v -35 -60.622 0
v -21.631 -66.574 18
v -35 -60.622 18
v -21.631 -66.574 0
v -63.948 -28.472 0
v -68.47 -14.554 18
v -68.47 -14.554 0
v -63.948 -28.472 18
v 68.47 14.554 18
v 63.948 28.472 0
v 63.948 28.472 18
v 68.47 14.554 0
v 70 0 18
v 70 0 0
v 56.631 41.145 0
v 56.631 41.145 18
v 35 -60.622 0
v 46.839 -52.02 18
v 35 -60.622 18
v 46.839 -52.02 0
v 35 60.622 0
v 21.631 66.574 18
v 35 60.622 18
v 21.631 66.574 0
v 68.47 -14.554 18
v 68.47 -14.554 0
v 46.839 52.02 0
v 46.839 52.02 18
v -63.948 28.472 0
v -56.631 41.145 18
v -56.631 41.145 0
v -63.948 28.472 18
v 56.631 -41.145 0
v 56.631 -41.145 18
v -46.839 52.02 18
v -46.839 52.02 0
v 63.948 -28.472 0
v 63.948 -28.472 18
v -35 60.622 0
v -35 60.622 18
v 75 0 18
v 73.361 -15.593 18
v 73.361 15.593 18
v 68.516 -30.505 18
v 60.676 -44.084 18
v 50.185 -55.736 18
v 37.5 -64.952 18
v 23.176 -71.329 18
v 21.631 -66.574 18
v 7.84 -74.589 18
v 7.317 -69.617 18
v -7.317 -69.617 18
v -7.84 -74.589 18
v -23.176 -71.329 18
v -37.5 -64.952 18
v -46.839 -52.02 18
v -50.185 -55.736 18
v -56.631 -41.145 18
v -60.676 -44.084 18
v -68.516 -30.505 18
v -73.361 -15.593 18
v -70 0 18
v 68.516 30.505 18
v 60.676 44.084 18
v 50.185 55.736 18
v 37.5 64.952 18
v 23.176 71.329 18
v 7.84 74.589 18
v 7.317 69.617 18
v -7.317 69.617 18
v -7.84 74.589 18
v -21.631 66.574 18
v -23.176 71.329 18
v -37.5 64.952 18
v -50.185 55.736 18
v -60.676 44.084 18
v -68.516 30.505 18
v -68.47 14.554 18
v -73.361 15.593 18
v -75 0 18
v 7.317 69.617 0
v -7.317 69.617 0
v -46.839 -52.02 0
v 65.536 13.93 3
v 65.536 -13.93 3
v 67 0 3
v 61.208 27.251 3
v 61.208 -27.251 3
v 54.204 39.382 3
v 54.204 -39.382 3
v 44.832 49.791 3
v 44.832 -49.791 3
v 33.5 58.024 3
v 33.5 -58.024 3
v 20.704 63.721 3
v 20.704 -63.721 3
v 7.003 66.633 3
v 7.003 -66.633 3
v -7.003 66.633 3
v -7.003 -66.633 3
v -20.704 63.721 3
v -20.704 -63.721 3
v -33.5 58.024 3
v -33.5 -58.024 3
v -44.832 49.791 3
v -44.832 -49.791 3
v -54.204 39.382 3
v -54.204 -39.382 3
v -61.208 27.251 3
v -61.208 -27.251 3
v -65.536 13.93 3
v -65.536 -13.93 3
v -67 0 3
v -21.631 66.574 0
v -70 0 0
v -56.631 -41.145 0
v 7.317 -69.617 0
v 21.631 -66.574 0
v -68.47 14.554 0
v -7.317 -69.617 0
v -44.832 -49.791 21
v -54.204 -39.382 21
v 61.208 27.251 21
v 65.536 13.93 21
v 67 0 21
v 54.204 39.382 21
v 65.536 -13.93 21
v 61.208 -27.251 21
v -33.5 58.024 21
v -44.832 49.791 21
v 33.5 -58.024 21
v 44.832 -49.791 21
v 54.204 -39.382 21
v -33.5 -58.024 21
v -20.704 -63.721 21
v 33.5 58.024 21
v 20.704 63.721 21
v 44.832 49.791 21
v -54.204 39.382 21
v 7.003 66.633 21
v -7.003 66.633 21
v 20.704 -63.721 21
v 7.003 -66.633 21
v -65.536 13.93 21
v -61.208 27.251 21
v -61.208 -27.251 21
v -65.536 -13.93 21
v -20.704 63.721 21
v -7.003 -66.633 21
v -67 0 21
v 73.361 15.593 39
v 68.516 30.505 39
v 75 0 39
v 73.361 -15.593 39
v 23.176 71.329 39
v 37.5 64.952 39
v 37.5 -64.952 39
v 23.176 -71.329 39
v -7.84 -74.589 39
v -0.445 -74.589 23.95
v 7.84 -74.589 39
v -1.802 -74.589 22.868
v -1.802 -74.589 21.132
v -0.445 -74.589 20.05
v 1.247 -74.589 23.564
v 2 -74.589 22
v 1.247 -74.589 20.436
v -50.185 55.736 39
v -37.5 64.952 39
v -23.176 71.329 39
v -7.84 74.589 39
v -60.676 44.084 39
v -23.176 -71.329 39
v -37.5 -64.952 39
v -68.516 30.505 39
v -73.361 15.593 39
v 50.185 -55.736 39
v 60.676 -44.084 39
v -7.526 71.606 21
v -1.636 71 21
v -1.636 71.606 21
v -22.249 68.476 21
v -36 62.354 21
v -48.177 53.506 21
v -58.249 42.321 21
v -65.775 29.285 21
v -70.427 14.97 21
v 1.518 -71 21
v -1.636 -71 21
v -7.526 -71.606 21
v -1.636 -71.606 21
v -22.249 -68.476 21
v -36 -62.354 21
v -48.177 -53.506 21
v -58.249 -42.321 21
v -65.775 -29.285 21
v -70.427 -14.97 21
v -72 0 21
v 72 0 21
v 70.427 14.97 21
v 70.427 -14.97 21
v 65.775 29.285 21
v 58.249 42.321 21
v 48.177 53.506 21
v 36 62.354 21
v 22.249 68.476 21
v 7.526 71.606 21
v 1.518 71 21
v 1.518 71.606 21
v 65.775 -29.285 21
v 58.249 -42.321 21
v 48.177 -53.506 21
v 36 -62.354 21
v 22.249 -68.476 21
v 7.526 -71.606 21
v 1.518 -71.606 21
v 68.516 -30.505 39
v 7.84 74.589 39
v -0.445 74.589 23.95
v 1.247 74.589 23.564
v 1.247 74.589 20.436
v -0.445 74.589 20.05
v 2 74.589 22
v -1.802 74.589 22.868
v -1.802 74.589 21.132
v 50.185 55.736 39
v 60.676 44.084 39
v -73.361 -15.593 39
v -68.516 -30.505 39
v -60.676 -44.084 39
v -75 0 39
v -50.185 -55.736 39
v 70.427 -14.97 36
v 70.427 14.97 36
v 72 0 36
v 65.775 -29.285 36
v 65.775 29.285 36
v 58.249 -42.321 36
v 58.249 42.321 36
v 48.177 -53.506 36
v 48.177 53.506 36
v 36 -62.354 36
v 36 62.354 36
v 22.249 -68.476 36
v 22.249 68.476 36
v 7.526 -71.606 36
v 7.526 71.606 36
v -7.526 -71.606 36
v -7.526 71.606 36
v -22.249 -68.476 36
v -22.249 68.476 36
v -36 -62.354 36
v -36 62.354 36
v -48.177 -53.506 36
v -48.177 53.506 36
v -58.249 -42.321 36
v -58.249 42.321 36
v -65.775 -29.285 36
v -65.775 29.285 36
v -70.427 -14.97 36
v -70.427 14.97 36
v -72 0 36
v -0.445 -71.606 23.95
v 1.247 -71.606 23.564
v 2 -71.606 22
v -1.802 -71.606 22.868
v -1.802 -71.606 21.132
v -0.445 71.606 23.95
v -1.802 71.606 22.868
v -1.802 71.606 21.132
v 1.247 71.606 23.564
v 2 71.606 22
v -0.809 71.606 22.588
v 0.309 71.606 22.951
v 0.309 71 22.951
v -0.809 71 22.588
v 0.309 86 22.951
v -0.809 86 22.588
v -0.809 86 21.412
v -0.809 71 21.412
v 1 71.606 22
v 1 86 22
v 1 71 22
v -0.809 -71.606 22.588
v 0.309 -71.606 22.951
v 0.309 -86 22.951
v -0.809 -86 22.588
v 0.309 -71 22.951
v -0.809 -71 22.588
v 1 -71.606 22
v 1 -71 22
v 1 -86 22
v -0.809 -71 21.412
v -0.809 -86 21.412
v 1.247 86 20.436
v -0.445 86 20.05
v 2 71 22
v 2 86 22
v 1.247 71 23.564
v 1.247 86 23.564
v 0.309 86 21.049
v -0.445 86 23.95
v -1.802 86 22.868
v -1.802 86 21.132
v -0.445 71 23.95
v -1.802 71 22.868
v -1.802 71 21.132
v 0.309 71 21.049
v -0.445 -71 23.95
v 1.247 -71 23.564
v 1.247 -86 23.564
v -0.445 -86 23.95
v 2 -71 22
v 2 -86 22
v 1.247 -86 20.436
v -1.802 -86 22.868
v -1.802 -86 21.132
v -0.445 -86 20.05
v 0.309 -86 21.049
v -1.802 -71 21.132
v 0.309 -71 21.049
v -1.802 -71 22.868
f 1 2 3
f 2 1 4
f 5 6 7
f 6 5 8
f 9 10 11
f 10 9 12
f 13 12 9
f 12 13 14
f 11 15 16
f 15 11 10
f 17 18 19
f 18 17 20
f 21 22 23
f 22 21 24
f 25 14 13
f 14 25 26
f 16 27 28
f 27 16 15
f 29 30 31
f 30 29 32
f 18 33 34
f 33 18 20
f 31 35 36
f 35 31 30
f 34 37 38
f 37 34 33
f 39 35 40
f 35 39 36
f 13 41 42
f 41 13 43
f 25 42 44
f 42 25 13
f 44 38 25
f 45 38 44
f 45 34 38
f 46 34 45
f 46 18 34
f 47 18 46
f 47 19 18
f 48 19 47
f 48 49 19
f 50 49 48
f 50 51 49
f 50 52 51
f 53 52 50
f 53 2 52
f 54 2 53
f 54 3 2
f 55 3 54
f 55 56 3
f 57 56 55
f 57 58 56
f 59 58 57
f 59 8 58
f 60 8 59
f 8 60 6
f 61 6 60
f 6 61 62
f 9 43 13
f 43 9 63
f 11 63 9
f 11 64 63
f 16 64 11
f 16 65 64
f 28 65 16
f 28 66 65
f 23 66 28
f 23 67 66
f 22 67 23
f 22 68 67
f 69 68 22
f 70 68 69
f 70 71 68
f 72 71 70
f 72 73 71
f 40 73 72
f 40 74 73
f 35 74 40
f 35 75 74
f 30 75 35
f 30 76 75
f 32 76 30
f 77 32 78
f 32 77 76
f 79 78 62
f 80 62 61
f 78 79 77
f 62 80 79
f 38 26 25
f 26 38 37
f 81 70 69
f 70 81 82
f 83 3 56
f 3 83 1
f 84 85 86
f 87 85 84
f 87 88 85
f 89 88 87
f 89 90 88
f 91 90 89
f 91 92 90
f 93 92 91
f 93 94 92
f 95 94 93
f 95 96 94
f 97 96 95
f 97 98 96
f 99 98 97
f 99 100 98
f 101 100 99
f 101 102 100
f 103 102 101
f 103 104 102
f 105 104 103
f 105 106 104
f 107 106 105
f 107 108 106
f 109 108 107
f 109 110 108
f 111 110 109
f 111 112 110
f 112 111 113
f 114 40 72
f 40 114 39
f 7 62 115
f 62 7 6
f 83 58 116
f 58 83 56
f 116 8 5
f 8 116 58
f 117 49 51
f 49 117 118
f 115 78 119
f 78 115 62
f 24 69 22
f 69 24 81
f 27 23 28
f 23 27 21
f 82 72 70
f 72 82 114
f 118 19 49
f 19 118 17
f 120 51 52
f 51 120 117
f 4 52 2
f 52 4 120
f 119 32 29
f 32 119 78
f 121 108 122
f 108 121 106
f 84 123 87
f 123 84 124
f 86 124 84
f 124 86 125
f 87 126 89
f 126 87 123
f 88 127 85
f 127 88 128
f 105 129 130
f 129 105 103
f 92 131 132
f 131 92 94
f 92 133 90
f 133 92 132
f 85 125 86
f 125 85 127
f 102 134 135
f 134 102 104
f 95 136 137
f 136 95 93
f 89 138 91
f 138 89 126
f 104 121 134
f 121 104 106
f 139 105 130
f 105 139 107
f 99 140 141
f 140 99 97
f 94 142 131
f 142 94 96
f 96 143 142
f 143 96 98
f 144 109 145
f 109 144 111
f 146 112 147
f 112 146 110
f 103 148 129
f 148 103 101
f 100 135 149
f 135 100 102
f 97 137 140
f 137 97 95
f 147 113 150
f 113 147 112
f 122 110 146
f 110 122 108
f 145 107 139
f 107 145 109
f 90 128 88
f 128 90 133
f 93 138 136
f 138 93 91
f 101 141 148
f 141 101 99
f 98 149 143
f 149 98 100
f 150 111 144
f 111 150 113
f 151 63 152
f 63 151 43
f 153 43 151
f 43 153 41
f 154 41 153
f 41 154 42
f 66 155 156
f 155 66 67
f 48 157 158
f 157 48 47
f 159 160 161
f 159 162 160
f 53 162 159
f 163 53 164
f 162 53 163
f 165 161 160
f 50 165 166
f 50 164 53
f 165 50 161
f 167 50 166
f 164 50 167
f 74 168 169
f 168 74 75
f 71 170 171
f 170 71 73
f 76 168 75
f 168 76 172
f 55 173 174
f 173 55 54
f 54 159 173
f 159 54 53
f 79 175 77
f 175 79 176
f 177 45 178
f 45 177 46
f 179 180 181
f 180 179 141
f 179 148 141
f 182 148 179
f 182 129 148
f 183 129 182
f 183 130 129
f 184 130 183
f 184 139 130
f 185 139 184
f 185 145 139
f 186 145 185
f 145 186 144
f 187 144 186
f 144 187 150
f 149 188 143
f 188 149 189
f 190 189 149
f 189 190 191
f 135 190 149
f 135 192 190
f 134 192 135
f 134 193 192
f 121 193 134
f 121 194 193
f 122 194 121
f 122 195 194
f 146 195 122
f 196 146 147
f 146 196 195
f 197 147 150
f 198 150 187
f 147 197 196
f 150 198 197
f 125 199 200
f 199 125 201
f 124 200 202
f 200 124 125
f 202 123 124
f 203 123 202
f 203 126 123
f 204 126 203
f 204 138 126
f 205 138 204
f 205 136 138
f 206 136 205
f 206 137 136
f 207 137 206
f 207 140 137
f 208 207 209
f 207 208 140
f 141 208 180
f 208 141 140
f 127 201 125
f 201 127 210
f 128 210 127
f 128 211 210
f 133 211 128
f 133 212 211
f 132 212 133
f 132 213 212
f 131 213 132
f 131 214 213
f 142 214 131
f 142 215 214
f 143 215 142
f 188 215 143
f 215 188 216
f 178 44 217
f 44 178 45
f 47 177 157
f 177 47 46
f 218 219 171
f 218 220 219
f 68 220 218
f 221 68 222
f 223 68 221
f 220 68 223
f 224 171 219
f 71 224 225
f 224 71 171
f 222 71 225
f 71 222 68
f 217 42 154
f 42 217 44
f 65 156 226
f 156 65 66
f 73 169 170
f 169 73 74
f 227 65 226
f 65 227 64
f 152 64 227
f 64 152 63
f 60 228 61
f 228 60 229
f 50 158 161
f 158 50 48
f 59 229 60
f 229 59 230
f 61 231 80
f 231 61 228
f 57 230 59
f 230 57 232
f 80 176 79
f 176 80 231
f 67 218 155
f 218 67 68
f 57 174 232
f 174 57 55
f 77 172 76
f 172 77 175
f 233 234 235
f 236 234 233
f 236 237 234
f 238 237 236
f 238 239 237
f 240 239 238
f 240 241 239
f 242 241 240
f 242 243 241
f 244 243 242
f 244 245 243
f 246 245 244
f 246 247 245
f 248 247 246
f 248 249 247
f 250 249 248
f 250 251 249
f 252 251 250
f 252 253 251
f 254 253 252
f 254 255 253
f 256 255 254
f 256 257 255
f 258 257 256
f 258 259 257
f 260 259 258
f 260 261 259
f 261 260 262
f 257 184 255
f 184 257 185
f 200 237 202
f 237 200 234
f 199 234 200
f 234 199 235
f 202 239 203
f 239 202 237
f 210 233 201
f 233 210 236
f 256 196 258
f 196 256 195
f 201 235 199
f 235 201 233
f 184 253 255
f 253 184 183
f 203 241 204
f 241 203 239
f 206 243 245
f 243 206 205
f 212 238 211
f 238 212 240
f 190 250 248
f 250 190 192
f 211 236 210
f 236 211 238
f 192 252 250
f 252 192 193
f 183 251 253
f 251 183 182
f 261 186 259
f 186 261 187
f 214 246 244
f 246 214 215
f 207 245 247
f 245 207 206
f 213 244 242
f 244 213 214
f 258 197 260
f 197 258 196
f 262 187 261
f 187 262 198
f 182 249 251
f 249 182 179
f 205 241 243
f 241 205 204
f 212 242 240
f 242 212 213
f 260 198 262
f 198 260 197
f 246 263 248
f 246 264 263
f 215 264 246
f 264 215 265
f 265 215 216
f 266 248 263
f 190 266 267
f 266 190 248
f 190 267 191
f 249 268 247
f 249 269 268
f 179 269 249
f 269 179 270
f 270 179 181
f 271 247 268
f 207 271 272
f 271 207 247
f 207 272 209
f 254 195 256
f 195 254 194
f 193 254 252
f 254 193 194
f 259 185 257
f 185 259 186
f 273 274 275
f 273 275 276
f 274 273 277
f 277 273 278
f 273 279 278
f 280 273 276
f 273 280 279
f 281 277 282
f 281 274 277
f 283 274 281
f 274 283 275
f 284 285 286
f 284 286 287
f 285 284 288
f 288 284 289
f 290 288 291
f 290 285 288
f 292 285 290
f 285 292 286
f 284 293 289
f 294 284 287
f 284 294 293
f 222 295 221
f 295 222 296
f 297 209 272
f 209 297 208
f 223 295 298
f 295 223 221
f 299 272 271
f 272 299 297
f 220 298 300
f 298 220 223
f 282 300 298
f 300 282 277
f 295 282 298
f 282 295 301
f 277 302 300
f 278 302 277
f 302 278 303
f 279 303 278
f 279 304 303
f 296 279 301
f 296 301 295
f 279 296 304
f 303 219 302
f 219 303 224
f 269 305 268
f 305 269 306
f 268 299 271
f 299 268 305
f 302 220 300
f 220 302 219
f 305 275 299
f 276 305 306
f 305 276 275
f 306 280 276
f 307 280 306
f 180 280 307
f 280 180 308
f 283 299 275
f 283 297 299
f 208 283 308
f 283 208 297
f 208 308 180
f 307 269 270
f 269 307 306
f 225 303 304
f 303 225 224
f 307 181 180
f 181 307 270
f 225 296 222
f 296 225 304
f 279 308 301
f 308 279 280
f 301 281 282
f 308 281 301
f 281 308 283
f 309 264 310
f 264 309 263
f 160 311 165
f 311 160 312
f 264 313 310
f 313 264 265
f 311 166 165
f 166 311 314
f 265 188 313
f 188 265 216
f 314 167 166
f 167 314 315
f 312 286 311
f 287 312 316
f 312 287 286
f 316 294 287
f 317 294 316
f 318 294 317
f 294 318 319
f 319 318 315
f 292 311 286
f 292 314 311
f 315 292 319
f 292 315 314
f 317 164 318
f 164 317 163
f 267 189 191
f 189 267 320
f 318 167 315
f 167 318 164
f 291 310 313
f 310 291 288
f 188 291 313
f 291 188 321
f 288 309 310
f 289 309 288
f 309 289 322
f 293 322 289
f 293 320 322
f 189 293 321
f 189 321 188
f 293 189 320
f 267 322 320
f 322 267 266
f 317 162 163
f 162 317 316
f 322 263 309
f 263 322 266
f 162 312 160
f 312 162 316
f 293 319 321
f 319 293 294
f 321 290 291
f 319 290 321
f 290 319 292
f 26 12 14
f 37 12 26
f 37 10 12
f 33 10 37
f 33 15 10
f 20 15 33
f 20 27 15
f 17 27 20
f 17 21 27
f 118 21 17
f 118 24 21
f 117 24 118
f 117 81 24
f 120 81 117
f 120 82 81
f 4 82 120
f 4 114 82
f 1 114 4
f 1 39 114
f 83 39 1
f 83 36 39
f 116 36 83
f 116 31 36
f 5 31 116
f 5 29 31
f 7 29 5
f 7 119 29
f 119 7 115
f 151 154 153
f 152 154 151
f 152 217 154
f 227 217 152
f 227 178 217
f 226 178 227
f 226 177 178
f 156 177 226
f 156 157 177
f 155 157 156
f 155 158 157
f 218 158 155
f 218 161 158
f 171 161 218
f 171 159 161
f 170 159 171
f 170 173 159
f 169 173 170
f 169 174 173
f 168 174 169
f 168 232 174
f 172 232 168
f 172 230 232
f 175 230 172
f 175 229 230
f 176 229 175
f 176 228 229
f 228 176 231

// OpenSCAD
Dmax=140; // diameter of main volume
wallThikness=3; // Товщина стінки обєму з водою 
hWaterChamber=30; // Висота об'єму з водою 
lFaska=5; // Величина виступ-зацепа зверху об'єму з водою 

// Model code below
module tube(dMax, thikness, lenghth) {
  difference() {
    cylinder(h=lenghth, r1=dMax/2, r2=dMax/2);
   
    translate([0, 0, -1])
        
    cylinder(lenghth+2, dMax/2-thikness, dMax/2-thikness);
  }
}


module disk(dMax, thikness) {
    cylinder(thikness, dMax/2, dMax/2);
}


////////////////////////

module main() {
    
// Дно
disk(Dmax, wallThikness);

// Бокова стінка яка всередині циліндра
translate([0, 0, wallThikness])
  tube(Dmax, wallThikness, hWaterChamber/2);

color("orange")  
translate([0, 0, wallThikness+hWaterChamber/2])
  tube(Dmax+2*lFaska, lFaska+wallThikness, wallThikness);


// Бокова стінка яка ззовні циліндра
translate([0, 0, 2*wallThikness+hWaterChamber/2])
  difference() {

    tube(Dmax+2*lFaska, wallThikness, hWaterChamber/2);
   
     // Отвір для вводу води 
     translate([0, Dmax/2+lFaska-wallThikness-2, 1])
       rotate([-90,0,0])
         cylinder(wallThikness+15-1, 1, 1);

     // Отвір для виводу води 
     translate([0, -(Dmax/2+lFaska-wallThikness-2), 1])
       rotate([90,0,0])
         cylinder(wallThikness+15-1+500, 1, 1);

  }
/*  
  color("red") 
translate([0, 0, 2*wallThikness+hWaterChamber/2])  

translate([0, Dmax/2+lFaska-wallThikness-2, 1])
  rotate([-90,0,0])
    cylinder(wallThikness+15-1, 1, 1);
*/  

// Верхня кришка
translate([0, 0, 2*wallThikness+hWaterChamber])
  disk(Dmax+2*lFaska, wallThikness);


// Сосок отвору для вводу води     
translate([0, Dmax/2+lFaska-wallThikness-1, 2*wallThikness+hWaterChamber/2+1])
  rotate([-90,0,0])
    tube(4, 1, 15);

// Сосок отвору для виводу води     
translate([0, -(Dmax/2+lFaska-wallThikness-1), 2*wallThikness+hWaterChamber/2+1])
  rotate([90,0,0])
    tube(4, 1, 15);

    
/*
  difference() {
    disk(Dmax+lFaska, wallThikness);
   
    //translate([0, 0, -1])
        
    disk(Dmax, wallThikness);
  }
  */
  
 }

main();
 
 
 
 

rotate([0,-90,0])
  translate([-100,0,0])
    projection(cut=true)
      translate([0,0,0])
        rotate([0,90,0]) main(); 
 
